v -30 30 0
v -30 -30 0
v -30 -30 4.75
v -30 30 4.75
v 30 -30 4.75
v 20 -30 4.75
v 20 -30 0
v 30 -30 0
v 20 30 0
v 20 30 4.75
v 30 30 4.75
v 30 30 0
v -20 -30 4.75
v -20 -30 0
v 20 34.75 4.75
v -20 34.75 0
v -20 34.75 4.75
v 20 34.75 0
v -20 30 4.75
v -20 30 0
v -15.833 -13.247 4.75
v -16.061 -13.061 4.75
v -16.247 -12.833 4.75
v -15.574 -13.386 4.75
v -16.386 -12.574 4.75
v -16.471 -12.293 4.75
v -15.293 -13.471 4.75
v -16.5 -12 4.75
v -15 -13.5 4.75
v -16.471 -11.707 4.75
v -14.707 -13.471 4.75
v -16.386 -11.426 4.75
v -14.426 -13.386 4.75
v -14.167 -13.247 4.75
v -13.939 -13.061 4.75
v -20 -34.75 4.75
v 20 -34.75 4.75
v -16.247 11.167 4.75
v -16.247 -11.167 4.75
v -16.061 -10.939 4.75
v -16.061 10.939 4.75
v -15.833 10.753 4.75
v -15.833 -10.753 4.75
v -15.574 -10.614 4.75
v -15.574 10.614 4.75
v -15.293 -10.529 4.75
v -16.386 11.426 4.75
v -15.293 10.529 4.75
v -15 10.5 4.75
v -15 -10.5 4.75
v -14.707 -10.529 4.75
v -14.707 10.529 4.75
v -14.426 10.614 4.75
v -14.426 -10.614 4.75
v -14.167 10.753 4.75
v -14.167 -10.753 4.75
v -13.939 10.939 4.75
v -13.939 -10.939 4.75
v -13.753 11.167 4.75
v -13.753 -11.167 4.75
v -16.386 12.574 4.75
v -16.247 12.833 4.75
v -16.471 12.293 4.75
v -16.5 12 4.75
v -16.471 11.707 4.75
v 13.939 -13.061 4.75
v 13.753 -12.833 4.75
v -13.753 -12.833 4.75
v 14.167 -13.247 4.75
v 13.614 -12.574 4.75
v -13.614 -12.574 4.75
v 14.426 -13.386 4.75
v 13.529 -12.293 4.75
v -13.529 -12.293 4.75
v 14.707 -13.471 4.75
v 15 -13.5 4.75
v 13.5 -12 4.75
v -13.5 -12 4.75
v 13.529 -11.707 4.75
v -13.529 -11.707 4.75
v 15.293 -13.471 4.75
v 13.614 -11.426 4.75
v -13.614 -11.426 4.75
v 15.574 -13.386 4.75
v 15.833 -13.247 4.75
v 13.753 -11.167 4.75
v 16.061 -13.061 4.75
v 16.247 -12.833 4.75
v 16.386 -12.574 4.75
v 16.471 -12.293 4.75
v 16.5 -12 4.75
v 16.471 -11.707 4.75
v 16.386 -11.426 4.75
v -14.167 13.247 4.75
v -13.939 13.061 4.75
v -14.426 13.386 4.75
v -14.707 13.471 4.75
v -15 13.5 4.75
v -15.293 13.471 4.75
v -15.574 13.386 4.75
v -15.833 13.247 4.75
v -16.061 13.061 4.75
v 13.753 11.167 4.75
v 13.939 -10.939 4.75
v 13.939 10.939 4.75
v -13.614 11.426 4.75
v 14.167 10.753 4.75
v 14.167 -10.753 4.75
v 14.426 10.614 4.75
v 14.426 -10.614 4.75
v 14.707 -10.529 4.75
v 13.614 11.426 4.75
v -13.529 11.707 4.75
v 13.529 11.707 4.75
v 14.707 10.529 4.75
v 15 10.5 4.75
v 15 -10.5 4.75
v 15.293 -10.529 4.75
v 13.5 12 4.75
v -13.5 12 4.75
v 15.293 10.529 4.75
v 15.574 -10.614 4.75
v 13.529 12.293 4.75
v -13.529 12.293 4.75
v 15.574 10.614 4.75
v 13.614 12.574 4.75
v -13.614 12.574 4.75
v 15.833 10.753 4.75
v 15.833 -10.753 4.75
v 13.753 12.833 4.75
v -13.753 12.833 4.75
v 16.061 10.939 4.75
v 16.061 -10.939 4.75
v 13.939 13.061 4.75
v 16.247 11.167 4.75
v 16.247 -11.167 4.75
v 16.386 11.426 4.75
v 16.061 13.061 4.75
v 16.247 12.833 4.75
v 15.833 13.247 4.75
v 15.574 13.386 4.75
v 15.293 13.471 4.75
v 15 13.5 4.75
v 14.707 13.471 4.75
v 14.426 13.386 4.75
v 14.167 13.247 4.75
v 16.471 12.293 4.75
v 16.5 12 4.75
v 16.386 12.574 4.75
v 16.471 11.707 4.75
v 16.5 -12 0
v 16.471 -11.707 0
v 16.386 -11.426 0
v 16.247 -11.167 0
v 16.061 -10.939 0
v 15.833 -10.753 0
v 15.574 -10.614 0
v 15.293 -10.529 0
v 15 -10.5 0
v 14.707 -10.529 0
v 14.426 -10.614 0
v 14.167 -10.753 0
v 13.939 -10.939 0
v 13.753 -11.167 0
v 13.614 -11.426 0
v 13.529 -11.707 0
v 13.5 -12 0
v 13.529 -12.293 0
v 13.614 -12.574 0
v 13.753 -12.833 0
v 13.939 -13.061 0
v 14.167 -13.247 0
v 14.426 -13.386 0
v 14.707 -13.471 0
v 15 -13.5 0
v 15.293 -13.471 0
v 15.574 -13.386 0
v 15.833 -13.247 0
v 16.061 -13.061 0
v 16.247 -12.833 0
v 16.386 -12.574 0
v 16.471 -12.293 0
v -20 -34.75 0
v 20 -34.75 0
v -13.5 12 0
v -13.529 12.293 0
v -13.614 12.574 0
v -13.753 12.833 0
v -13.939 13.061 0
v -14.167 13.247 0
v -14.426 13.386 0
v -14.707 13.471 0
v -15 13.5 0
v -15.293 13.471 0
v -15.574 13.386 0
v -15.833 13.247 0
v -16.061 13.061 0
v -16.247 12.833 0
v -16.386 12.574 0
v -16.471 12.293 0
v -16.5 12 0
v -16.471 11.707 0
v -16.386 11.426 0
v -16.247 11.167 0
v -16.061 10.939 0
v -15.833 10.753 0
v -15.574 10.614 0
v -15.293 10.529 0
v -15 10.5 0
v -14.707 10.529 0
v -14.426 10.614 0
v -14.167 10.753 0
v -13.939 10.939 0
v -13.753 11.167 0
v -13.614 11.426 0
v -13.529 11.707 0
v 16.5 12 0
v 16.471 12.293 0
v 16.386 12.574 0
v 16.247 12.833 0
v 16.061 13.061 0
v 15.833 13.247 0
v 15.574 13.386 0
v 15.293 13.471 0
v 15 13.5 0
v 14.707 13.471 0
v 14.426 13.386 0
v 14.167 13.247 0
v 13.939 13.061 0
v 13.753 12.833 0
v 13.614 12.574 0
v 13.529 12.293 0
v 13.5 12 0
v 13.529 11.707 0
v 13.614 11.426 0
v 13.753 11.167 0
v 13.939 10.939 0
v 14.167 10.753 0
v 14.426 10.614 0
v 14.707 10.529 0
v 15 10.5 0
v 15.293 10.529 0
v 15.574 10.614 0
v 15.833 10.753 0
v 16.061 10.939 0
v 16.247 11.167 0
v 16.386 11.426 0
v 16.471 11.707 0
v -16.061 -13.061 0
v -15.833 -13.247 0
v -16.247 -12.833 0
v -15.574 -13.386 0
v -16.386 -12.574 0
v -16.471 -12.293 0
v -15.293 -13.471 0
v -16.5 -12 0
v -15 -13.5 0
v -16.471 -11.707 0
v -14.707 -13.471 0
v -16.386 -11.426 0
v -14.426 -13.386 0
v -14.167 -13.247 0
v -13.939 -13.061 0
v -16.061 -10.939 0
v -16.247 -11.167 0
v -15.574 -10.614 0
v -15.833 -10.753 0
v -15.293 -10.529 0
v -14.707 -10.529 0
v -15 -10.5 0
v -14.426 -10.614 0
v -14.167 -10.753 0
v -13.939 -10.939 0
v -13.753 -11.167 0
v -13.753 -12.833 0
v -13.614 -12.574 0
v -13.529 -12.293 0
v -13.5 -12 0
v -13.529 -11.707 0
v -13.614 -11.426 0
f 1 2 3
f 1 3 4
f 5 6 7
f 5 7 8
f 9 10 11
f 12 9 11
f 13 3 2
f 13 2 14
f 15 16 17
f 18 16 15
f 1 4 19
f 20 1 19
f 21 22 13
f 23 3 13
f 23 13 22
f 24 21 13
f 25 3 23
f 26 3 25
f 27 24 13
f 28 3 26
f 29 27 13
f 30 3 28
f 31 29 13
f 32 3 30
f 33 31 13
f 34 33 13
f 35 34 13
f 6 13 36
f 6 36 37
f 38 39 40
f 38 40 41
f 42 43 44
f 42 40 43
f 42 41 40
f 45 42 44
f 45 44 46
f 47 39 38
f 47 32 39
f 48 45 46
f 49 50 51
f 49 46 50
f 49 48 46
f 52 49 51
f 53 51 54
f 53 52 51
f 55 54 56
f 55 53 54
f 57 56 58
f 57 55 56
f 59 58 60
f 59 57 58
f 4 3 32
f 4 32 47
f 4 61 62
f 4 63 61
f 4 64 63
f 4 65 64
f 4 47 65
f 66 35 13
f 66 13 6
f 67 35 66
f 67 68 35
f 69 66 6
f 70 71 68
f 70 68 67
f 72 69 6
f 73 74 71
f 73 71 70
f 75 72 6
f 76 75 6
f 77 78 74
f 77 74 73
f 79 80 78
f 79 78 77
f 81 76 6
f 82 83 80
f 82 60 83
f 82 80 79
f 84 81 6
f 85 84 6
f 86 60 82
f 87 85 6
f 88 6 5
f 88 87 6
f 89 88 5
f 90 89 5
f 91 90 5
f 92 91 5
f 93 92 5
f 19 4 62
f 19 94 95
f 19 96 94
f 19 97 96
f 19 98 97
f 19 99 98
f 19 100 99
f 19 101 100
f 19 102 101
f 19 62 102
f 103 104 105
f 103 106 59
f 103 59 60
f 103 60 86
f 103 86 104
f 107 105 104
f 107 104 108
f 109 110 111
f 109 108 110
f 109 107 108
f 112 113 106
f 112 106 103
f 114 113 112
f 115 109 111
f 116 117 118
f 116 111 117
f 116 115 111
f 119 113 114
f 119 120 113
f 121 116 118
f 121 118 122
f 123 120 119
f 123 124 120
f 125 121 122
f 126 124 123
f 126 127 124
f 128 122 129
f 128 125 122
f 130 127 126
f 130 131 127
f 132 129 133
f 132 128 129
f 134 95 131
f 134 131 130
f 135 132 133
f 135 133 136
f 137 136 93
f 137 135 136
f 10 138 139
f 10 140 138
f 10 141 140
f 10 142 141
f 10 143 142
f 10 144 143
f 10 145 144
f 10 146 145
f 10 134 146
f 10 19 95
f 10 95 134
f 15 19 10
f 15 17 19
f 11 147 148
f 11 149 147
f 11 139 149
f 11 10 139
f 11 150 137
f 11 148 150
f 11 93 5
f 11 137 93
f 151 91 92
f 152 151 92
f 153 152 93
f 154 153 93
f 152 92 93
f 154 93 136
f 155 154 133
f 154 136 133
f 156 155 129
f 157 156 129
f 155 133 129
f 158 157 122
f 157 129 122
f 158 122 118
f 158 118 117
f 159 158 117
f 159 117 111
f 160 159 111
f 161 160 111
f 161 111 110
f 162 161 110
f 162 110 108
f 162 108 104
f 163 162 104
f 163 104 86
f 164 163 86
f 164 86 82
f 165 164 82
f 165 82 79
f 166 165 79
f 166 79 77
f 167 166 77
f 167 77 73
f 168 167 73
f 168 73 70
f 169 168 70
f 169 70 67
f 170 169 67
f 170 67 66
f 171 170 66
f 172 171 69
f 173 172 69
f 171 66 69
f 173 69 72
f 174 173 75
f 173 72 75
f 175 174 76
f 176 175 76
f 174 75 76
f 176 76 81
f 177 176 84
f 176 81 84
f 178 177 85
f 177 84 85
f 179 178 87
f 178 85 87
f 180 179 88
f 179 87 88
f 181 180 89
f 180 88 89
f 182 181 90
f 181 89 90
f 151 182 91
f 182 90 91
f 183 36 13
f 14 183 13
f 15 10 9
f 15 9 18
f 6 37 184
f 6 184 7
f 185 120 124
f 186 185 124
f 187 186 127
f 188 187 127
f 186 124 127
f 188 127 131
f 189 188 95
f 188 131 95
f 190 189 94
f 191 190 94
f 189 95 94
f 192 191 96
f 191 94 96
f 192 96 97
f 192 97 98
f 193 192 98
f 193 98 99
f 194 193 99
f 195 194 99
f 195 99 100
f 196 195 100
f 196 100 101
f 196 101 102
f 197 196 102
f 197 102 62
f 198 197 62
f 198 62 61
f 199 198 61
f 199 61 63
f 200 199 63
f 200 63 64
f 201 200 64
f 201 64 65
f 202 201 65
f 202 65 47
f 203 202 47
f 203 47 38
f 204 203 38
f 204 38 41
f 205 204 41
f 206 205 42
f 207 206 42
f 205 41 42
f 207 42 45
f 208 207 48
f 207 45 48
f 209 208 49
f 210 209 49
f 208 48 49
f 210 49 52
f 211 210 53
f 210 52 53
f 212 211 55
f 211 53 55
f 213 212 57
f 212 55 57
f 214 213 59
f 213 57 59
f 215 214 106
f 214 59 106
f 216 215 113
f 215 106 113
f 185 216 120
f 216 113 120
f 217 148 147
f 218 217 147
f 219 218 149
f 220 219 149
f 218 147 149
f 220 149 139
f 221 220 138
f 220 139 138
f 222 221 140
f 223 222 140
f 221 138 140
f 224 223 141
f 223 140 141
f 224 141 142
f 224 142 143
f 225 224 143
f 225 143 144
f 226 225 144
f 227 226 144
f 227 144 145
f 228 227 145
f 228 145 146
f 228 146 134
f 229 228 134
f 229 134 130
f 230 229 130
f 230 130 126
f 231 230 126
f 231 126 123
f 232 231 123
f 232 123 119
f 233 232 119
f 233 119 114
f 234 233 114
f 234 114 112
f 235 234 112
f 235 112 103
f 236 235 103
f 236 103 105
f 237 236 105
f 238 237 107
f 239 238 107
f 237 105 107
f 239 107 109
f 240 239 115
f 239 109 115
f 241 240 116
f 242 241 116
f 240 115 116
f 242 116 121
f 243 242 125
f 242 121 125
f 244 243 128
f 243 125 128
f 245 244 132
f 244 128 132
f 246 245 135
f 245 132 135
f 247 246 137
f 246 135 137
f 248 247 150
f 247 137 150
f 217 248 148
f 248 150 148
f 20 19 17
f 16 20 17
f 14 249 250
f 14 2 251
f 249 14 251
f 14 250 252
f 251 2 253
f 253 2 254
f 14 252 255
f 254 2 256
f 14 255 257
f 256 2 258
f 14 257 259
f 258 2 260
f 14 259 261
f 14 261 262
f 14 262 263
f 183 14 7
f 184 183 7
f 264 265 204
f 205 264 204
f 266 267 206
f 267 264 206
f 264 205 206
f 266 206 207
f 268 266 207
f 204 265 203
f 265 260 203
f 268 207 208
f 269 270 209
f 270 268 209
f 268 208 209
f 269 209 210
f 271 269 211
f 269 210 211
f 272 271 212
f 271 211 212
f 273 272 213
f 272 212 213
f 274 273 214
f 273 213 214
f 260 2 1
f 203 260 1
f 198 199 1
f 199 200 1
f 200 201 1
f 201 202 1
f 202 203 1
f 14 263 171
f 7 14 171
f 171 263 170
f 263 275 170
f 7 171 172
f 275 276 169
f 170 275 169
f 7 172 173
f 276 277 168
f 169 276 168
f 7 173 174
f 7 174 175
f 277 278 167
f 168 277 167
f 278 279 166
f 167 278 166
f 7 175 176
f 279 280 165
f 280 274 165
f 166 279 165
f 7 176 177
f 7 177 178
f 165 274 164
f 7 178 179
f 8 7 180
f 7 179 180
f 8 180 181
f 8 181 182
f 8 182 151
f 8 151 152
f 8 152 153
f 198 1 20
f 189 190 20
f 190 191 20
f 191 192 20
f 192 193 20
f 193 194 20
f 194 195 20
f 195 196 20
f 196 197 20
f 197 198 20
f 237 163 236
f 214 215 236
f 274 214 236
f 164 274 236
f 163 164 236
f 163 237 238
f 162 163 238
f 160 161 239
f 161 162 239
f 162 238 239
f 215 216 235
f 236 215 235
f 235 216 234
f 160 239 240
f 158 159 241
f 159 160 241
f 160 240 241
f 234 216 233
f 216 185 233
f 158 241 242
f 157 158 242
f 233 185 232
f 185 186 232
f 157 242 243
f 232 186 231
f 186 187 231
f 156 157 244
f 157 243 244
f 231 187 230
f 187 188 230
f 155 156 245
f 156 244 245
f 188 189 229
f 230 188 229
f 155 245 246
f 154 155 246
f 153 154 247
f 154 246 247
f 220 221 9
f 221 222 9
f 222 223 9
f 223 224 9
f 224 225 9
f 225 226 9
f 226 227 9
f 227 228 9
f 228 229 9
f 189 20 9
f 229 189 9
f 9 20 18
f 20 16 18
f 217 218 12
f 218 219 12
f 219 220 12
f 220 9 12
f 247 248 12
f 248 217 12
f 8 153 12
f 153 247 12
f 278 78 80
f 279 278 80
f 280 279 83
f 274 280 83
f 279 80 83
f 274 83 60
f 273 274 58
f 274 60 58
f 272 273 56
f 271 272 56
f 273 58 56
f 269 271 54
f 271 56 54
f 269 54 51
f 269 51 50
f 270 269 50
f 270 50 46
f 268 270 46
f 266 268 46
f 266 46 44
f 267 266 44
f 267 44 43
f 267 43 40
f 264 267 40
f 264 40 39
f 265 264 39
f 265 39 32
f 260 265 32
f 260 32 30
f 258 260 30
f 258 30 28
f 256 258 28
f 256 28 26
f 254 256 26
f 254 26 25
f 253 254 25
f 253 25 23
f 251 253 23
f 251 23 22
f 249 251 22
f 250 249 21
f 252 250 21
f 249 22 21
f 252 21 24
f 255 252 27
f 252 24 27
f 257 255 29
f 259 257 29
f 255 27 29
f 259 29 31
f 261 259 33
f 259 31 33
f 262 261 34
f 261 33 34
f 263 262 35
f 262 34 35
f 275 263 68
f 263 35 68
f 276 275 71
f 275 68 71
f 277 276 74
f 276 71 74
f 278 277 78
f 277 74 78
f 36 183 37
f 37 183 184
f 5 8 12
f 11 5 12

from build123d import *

# Parameters (mm, degrees)
SKETCH1_W               = 60
SKETCH1_H               = 69.5
BOSS_EXTRUDE1_DEPTH     = 4.75
SKETCH2_W               = 10
SKETCH2_H               = 4.75
CUT_EXTRUDE1_DEPTH      = 1
CUT_EXTRUDE1_DEPTH_BACK = 5.75
SKETCH3_R               = 1.5
CUT_EXTRUDE2_DEPTH      = 1
CUT_EXTRUDE2_DEPTH_BACK = 5.75


with BuildPart() as part:
    # Sketch1 → Boss-Extrude1 (new body)
    with BuildSketch(Plane.XY):
        Rectangle(SKETCH1_W, SKETCH1_H)
    extrude(amount=BOSS_EXTRUDE1_DEPTH)

    # Sketch2 → Cut-Extrude1 (cut, two sides)
    with BuildSketch(Plane.XY.offset(4.75)) as cut_extrude1_sk:
        with Locations((-25, 32.375)):
            Rectangle(SKETCH2_W, SKETCH2_H)
        with Locations((-25, -32.375)):
            Rectangle(SKETCH2_W, SKETCH2_H)
        with Locations((25, -32.375)):
            Rectangle(SKETCH2_W, SKETCH2_H)
        with Locations((25, 32.375)):
            Rectangle(SKETCH2_W, SKETCH2_H)
    extrude(amount=CUT_EXTRUDE1_DEPTH, mode=Mode.SUBTRACT)
    extrude(cut_extrude1_sk.sketch, amount=-CUT_EXTRUDE1_DEPTH_BACK, mode=Mode.SUBTRACT)

    # Sketch3 → Cut-Extrude2 (cut, two sides)
    with BuildSketch(Plane.XY.offset(4.75)) as cut_extrude2_sk:
        with Locations((-15, 12)):
            Circle(SKETCH3_R)
        with Locations((-15, -12)):
            Circle(SKETCH3_R)
        with Locations((15, -12)):
            Circle(SKETCH3_R)
        with Locations((15, 12)):
            Circle(SKETCH3_R)
    extrude(amount=CUT_EXTRUDE2_DEPTH, mode=Mode.SUBTRACT)
    extrude(cut_extrude2_sk.sketch, amount=-CUT_EXTRUDE2_DEPTH_BACK, mode=Mode.SUBTRACT)


solid = part.part
